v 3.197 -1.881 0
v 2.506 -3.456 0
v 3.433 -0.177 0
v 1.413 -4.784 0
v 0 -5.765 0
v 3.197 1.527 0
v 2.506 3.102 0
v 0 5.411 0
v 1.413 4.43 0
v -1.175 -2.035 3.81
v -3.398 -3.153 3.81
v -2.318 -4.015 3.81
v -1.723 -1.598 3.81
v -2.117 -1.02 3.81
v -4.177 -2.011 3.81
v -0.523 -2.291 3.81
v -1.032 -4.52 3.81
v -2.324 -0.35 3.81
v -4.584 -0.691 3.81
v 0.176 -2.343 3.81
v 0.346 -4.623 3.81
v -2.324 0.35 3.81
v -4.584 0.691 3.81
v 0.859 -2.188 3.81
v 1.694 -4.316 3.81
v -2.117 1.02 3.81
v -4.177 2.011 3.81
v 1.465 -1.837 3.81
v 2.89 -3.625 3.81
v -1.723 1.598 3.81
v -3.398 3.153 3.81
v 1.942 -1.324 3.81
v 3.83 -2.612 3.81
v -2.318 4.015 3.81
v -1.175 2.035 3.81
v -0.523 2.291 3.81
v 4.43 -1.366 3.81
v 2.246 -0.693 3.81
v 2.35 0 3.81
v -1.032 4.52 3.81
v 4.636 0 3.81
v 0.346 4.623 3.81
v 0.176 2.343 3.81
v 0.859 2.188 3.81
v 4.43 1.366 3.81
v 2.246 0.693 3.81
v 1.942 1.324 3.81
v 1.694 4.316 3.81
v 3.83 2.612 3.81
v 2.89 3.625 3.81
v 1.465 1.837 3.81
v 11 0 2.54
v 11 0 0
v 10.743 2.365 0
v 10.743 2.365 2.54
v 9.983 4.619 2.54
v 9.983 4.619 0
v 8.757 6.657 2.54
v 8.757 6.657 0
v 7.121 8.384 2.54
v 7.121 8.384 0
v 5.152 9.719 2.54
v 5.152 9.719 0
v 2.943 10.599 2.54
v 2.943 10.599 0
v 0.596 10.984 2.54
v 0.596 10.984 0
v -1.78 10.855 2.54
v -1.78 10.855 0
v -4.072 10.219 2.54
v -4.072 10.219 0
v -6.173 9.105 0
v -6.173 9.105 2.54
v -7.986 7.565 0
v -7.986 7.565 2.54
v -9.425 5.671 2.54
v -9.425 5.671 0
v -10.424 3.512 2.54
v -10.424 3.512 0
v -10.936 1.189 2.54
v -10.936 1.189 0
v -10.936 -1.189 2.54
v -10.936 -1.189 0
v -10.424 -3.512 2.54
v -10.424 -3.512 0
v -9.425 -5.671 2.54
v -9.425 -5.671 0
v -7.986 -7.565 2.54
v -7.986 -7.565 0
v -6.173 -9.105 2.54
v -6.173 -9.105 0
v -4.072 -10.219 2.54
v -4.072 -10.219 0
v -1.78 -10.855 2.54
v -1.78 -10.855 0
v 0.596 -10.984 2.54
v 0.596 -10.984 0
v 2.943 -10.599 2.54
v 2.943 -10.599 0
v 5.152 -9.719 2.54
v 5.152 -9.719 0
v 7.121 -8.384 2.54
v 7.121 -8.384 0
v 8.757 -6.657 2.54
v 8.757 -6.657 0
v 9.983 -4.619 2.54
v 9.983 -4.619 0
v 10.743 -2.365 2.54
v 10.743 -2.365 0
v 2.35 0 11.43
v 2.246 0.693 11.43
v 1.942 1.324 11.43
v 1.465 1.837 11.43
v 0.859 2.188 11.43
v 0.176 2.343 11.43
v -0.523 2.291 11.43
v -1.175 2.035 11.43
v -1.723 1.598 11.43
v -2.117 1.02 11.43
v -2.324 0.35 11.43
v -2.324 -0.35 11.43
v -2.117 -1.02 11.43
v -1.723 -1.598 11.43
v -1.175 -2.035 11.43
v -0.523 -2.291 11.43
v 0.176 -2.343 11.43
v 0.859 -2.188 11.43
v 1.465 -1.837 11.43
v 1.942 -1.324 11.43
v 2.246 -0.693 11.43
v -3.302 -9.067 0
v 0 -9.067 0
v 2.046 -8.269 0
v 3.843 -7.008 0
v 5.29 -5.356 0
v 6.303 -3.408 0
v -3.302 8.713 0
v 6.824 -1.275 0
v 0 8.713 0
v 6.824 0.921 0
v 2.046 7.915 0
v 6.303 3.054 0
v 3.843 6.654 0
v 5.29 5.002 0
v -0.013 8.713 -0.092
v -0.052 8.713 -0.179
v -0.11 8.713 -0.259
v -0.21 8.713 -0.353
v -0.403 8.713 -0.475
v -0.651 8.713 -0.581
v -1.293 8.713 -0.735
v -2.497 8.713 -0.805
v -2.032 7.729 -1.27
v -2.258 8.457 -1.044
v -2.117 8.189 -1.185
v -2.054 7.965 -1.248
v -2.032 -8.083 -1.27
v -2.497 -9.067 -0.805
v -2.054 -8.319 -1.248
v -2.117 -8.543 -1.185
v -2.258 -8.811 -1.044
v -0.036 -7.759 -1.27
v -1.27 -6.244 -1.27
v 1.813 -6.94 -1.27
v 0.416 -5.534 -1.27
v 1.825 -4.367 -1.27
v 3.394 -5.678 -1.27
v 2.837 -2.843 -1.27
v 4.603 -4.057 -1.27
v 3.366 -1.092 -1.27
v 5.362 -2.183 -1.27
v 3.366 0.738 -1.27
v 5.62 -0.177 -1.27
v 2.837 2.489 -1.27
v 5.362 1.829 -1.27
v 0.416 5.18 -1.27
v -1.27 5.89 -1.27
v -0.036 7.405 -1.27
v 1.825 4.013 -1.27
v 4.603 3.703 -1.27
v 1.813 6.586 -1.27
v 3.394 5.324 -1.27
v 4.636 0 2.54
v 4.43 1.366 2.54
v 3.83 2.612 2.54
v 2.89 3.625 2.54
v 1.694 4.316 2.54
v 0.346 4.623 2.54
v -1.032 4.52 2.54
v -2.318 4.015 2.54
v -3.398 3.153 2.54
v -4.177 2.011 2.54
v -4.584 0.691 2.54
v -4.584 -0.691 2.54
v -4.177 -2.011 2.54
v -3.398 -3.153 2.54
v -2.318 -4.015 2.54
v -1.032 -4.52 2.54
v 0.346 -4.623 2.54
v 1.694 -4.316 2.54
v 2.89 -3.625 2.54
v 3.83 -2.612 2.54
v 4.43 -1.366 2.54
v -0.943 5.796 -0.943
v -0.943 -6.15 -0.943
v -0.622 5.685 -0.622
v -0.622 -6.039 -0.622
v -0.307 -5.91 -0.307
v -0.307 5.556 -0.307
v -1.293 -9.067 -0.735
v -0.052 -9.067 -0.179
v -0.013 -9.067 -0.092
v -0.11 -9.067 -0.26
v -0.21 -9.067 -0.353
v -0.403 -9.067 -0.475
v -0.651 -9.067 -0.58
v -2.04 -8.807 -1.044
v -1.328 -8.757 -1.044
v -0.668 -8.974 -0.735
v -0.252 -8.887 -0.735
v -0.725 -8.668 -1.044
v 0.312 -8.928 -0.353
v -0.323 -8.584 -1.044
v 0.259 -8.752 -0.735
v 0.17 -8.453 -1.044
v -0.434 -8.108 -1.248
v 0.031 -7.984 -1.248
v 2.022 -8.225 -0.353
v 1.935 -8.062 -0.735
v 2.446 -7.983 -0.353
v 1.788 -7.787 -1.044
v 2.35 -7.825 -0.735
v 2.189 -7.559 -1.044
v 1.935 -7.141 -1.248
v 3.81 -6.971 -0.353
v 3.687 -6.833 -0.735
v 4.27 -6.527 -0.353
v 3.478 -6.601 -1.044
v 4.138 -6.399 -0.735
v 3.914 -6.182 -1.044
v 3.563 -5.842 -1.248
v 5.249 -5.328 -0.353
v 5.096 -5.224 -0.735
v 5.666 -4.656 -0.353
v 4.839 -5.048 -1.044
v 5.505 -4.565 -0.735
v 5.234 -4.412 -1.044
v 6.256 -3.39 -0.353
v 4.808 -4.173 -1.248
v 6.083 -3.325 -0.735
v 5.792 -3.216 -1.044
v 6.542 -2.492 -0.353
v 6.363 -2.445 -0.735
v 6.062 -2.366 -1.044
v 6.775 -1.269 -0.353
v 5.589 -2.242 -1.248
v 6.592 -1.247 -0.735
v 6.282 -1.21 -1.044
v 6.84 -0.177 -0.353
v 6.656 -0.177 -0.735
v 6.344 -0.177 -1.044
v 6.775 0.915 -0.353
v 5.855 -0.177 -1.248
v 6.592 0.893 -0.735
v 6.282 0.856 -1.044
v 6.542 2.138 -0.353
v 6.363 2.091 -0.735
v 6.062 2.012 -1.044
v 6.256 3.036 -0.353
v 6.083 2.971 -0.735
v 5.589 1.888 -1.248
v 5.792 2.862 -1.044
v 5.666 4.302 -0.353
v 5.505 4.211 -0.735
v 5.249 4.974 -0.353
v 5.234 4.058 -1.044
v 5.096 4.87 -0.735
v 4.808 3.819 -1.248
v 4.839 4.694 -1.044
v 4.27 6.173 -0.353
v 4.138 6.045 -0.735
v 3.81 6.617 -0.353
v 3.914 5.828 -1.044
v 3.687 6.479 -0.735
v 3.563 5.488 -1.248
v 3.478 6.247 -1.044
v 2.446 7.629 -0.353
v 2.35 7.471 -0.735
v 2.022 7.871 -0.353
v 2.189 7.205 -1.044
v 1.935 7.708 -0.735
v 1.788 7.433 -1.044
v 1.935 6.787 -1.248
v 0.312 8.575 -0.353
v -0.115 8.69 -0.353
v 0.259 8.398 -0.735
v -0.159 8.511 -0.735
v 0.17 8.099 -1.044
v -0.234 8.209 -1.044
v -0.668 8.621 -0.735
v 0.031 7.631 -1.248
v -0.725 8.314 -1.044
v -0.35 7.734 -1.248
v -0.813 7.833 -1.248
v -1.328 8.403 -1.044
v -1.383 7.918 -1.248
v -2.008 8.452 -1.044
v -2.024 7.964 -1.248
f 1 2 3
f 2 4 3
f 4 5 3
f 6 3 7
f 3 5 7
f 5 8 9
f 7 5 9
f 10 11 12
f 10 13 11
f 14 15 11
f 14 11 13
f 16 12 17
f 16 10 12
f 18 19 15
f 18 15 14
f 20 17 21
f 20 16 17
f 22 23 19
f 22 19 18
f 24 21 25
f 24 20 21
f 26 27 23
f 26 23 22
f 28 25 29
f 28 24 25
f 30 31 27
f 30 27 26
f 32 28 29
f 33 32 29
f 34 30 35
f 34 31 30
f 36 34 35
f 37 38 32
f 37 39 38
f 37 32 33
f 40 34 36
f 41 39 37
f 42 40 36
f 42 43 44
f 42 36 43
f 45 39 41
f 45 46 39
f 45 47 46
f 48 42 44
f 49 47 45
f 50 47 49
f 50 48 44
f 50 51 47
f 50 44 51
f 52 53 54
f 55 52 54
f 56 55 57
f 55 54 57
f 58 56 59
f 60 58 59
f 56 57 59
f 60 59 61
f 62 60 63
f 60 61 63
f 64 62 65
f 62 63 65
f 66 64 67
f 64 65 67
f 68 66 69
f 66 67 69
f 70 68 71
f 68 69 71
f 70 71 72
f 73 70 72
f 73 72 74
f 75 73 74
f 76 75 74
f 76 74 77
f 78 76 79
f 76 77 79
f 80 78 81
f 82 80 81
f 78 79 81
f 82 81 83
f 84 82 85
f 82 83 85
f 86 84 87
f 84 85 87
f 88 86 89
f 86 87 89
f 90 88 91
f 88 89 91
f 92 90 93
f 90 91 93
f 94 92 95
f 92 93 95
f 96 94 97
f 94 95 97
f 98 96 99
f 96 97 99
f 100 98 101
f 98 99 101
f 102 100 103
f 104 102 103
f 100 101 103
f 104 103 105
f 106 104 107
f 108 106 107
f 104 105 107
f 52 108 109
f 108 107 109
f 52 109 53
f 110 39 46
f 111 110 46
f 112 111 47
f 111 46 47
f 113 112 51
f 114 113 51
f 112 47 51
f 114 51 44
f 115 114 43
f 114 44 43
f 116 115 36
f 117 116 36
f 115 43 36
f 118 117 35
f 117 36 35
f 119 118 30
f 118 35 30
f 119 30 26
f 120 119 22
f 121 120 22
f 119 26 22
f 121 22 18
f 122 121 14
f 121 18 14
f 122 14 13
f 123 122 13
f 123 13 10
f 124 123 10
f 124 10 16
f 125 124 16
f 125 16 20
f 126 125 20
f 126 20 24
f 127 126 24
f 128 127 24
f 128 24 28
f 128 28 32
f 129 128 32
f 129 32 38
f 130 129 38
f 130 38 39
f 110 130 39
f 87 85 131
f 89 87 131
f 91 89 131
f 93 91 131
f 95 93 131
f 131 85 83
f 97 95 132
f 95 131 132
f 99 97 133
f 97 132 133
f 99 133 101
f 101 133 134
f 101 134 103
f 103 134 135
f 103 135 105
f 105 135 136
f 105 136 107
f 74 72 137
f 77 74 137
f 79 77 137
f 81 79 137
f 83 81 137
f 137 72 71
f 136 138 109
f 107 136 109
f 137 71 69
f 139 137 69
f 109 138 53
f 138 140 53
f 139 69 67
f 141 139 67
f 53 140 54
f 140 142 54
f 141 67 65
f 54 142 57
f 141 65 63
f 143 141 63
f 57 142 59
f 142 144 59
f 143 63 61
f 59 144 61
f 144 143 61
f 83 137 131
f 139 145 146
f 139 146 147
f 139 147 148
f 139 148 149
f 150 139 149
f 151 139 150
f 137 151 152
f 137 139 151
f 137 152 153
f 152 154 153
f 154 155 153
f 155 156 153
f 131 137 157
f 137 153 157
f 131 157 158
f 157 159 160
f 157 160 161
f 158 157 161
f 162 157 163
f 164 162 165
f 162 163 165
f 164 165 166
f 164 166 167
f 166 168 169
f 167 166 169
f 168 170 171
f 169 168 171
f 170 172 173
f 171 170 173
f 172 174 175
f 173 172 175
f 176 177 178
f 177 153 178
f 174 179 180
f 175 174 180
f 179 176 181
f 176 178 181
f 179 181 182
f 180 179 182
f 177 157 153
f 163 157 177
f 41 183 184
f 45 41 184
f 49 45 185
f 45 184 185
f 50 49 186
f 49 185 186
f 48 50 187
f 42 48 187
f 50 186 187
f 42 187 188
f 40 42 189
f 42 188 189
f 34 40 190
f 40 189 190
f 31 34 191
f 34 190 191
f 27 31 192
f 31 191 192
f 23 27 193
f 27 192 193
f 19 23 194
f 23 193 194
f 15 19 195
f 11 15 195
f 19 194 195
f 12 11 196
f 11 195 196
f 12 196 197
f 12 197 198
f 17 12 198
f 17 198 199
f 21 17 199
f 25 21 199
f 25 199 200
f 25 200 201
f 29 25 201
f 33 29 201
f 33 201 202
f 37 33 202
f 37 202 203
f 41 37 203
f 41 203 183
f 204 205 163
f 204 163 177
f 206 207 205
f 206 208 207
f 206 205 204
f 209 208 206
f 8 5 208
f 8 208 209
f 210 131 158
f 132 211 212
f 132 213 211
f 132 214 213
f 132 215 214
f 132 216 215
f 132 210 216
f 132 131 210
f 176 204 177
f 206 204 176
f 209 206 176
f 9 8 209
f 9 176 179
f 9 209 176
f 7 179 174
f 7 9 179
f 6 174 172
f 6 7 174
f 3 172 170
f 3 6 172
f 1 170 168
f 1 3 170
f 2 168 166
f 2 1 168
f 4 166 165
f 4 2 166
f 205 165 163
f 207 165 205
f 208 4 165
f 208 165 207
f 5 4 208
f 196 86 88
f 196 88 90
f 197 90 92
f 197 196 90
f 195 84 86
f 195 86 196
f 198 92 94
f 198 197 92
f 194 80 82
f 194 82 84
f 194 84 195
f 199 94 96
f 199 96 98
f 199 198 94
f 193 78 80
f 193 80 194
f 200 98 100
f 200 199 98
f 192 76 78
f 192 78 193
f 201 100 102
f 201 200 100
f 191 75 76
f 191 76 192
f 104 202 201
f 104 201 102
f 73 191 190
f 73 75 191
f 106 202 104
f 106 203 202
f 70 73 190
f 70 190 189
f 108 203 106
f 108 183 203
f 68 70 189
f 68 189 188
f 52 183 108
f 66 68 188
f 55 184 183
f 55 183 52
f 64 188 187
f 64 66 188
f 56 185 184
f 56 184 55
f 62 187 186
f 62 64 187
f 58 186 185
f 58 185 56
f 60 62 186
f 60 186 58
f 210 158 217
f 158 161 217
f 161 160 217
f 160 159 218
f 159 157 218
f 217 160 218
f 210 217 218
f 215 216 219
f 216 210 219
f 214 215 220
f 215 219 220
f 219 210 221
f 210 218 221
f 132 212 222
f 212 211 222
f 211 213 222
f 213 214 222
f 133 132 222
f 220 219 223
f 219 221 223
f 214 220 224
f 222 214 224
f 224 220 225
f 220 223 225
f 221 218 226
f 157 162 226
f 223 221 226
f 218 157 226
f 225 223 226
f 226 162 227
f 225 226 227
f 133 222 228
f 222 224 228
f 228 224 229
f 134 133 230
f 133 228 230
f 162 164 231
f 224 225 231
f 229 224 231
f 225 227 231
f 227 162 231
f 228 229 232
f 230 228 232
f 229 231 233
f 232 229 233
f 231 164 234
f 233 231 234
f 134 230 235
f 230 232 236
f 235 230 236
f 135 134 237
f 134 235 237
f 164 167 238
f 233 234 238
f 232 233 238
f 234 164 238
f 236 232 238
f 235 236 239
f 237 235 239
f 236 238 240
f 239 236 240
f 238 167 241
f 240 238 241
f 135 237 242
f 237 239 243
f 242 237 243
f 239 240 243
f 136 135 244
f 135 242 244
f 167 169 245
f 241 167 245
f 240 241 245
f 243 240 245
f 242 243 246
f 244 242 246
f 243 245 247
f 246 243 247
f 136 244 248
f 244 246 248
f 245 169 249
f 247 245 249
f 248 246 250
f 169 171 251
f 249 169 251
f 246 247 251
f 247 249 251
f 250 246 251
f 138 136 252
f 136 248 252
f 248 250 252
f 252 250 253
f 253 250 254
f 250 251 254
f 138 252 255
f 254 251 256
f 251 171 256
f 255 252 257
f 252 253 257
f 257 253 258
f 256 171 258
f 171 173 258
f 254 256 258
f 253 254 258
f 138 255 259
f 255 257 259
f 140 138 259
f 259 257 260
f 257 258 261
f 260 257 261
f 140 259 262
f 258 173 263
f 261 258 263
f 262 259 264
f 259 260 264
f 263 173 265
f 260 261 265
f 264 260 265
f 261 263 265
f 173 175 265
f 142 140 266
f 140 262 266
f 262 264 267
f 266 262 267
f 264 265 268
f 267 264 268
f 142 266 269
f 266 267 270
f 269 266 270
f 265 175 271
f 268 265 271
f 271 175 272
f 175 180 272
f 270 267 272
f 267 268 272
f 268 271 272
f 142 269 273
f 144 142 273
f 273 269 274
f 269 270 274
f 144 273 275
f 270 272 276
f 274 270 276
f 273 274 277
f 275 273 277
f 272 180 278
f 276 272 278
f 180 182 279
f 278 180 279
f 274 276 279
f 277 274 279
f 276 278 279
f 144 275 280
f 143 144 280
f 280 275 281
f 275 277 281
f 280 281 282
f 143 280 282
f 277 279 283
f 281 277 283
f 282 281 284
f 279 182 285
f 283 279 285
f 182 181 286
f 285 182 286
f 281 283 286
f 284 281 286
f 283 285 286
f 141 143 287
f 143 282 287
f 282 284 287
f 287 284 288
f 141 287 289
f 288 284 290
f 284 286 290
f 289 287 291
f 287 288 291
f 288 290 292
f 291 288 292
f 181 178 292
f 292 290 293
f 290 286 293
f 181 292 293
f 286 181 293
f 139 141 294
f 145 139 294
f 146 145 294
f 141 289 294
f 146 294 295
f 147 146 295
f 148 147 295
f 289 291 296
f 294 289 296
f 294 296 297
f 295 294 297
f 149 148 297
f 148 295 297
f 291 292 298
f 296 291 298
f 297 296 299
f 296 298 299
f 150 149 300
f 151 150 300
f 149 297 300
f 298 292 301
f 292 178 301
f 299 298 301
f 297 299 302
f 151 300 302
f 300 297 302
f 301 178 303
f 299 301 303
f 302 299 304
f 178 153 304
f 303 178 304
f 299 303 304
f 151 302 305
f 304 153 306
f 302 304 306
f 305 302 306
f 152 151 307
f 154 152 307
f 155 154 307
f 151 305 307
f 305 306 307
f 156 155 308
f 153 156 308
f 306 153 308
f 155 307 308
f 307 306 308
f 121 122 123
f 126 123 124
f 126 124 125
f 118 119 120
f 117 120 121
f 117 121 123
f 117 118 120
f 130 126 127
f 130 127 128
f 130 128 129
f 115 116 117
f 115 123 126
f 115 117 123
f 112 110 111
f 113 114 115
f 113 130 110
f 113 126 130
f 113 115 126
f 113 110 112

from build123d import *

# Parameters (mm, degrees)
F0_R     = 2.35
F1_DEPTH = 11.43
F0_R_2   = 4.636
F2_DEPTH = 3.81
F0_R_3   = 11
F3_DEPTH = 2.54
F5_DEPTH = 1.27
F6_SIZE  = 1.26999
F7_R     = 1.26999


# Not quite as in the source:
# - a fillet or chamfer is up to 0.001 mm smaller than in the source, because OpenCascade refuses the exact size


with BuildPart() as f1:
    # F0 (on Top) → F1 (new body)
    with BuildSketch(Plane.XY):
        Circle(F0_R)
    extrude(amount=F1_DEPTH)

    # F0 (on Top) → F2 (join)
    with BuildSketch(Plane.XY):
        Circle(F0_R_2)
        Circle(F0_R, mode=Mode.SUBTRACT)
    extrude(amount=F2_DEPTH)

    # F0 (on Top) → F3 (join)
    with BuildSketch(Plane.XY):
        Circle(F0_R_3)
        Circle(F0_R_2, mode=Mode.SUBTRACT)
    extrude(amount=F3_DEPTH)

    # F4 (on face) → F5 (join)
    with BuildSketch(Plane.XY):
        with BuildLine():
            ThreePointArc((0, 5.4110168739), (3.4329052601, -0.1769831261), (0, -5.7649831261))
            Line((0, -5.7649831261), (0, -9.0669831261))
            ThreePointArc((0, -9.0669831261), (6.8902932862, -0.1769831261), (0, 8.7130168739))
            Line((0, 8.7130168739), (0, 5.4110168739))
        make_face()
        Polygon((0, -9.0669831261), (0, -5.7649831261), (0, 5.4110168739), (0, 8.7130168739), (-3.302, 8.7130168739), (-3.302, -9.0669831261), align=None)
    extrude(amount=-F5_DEPTH)

    # F6 (size 1.27 in the source; OpenCascade refuses exactly that, so slightly less here)
    f6_edges = [f1.edges().sort_by_distance(p)[0] for p in [
        (-3.302, -0.176983, -1.27),
        (0, -0.176983, -1.27),
    ]]
    chamfer(f6_edges, length=F6_SIZE)

    # F7 (radius 1.27 in the source; OpenCascade refuses exactly that, so slightly less here)
    f7_edges = [f1.edges().sort_by_distance(p)[0] for p in [
        (6.890293, -0.176983, -1.27),
    ]]
    fillet(f7_edges, radius=F7_R)


solid = f1.part
